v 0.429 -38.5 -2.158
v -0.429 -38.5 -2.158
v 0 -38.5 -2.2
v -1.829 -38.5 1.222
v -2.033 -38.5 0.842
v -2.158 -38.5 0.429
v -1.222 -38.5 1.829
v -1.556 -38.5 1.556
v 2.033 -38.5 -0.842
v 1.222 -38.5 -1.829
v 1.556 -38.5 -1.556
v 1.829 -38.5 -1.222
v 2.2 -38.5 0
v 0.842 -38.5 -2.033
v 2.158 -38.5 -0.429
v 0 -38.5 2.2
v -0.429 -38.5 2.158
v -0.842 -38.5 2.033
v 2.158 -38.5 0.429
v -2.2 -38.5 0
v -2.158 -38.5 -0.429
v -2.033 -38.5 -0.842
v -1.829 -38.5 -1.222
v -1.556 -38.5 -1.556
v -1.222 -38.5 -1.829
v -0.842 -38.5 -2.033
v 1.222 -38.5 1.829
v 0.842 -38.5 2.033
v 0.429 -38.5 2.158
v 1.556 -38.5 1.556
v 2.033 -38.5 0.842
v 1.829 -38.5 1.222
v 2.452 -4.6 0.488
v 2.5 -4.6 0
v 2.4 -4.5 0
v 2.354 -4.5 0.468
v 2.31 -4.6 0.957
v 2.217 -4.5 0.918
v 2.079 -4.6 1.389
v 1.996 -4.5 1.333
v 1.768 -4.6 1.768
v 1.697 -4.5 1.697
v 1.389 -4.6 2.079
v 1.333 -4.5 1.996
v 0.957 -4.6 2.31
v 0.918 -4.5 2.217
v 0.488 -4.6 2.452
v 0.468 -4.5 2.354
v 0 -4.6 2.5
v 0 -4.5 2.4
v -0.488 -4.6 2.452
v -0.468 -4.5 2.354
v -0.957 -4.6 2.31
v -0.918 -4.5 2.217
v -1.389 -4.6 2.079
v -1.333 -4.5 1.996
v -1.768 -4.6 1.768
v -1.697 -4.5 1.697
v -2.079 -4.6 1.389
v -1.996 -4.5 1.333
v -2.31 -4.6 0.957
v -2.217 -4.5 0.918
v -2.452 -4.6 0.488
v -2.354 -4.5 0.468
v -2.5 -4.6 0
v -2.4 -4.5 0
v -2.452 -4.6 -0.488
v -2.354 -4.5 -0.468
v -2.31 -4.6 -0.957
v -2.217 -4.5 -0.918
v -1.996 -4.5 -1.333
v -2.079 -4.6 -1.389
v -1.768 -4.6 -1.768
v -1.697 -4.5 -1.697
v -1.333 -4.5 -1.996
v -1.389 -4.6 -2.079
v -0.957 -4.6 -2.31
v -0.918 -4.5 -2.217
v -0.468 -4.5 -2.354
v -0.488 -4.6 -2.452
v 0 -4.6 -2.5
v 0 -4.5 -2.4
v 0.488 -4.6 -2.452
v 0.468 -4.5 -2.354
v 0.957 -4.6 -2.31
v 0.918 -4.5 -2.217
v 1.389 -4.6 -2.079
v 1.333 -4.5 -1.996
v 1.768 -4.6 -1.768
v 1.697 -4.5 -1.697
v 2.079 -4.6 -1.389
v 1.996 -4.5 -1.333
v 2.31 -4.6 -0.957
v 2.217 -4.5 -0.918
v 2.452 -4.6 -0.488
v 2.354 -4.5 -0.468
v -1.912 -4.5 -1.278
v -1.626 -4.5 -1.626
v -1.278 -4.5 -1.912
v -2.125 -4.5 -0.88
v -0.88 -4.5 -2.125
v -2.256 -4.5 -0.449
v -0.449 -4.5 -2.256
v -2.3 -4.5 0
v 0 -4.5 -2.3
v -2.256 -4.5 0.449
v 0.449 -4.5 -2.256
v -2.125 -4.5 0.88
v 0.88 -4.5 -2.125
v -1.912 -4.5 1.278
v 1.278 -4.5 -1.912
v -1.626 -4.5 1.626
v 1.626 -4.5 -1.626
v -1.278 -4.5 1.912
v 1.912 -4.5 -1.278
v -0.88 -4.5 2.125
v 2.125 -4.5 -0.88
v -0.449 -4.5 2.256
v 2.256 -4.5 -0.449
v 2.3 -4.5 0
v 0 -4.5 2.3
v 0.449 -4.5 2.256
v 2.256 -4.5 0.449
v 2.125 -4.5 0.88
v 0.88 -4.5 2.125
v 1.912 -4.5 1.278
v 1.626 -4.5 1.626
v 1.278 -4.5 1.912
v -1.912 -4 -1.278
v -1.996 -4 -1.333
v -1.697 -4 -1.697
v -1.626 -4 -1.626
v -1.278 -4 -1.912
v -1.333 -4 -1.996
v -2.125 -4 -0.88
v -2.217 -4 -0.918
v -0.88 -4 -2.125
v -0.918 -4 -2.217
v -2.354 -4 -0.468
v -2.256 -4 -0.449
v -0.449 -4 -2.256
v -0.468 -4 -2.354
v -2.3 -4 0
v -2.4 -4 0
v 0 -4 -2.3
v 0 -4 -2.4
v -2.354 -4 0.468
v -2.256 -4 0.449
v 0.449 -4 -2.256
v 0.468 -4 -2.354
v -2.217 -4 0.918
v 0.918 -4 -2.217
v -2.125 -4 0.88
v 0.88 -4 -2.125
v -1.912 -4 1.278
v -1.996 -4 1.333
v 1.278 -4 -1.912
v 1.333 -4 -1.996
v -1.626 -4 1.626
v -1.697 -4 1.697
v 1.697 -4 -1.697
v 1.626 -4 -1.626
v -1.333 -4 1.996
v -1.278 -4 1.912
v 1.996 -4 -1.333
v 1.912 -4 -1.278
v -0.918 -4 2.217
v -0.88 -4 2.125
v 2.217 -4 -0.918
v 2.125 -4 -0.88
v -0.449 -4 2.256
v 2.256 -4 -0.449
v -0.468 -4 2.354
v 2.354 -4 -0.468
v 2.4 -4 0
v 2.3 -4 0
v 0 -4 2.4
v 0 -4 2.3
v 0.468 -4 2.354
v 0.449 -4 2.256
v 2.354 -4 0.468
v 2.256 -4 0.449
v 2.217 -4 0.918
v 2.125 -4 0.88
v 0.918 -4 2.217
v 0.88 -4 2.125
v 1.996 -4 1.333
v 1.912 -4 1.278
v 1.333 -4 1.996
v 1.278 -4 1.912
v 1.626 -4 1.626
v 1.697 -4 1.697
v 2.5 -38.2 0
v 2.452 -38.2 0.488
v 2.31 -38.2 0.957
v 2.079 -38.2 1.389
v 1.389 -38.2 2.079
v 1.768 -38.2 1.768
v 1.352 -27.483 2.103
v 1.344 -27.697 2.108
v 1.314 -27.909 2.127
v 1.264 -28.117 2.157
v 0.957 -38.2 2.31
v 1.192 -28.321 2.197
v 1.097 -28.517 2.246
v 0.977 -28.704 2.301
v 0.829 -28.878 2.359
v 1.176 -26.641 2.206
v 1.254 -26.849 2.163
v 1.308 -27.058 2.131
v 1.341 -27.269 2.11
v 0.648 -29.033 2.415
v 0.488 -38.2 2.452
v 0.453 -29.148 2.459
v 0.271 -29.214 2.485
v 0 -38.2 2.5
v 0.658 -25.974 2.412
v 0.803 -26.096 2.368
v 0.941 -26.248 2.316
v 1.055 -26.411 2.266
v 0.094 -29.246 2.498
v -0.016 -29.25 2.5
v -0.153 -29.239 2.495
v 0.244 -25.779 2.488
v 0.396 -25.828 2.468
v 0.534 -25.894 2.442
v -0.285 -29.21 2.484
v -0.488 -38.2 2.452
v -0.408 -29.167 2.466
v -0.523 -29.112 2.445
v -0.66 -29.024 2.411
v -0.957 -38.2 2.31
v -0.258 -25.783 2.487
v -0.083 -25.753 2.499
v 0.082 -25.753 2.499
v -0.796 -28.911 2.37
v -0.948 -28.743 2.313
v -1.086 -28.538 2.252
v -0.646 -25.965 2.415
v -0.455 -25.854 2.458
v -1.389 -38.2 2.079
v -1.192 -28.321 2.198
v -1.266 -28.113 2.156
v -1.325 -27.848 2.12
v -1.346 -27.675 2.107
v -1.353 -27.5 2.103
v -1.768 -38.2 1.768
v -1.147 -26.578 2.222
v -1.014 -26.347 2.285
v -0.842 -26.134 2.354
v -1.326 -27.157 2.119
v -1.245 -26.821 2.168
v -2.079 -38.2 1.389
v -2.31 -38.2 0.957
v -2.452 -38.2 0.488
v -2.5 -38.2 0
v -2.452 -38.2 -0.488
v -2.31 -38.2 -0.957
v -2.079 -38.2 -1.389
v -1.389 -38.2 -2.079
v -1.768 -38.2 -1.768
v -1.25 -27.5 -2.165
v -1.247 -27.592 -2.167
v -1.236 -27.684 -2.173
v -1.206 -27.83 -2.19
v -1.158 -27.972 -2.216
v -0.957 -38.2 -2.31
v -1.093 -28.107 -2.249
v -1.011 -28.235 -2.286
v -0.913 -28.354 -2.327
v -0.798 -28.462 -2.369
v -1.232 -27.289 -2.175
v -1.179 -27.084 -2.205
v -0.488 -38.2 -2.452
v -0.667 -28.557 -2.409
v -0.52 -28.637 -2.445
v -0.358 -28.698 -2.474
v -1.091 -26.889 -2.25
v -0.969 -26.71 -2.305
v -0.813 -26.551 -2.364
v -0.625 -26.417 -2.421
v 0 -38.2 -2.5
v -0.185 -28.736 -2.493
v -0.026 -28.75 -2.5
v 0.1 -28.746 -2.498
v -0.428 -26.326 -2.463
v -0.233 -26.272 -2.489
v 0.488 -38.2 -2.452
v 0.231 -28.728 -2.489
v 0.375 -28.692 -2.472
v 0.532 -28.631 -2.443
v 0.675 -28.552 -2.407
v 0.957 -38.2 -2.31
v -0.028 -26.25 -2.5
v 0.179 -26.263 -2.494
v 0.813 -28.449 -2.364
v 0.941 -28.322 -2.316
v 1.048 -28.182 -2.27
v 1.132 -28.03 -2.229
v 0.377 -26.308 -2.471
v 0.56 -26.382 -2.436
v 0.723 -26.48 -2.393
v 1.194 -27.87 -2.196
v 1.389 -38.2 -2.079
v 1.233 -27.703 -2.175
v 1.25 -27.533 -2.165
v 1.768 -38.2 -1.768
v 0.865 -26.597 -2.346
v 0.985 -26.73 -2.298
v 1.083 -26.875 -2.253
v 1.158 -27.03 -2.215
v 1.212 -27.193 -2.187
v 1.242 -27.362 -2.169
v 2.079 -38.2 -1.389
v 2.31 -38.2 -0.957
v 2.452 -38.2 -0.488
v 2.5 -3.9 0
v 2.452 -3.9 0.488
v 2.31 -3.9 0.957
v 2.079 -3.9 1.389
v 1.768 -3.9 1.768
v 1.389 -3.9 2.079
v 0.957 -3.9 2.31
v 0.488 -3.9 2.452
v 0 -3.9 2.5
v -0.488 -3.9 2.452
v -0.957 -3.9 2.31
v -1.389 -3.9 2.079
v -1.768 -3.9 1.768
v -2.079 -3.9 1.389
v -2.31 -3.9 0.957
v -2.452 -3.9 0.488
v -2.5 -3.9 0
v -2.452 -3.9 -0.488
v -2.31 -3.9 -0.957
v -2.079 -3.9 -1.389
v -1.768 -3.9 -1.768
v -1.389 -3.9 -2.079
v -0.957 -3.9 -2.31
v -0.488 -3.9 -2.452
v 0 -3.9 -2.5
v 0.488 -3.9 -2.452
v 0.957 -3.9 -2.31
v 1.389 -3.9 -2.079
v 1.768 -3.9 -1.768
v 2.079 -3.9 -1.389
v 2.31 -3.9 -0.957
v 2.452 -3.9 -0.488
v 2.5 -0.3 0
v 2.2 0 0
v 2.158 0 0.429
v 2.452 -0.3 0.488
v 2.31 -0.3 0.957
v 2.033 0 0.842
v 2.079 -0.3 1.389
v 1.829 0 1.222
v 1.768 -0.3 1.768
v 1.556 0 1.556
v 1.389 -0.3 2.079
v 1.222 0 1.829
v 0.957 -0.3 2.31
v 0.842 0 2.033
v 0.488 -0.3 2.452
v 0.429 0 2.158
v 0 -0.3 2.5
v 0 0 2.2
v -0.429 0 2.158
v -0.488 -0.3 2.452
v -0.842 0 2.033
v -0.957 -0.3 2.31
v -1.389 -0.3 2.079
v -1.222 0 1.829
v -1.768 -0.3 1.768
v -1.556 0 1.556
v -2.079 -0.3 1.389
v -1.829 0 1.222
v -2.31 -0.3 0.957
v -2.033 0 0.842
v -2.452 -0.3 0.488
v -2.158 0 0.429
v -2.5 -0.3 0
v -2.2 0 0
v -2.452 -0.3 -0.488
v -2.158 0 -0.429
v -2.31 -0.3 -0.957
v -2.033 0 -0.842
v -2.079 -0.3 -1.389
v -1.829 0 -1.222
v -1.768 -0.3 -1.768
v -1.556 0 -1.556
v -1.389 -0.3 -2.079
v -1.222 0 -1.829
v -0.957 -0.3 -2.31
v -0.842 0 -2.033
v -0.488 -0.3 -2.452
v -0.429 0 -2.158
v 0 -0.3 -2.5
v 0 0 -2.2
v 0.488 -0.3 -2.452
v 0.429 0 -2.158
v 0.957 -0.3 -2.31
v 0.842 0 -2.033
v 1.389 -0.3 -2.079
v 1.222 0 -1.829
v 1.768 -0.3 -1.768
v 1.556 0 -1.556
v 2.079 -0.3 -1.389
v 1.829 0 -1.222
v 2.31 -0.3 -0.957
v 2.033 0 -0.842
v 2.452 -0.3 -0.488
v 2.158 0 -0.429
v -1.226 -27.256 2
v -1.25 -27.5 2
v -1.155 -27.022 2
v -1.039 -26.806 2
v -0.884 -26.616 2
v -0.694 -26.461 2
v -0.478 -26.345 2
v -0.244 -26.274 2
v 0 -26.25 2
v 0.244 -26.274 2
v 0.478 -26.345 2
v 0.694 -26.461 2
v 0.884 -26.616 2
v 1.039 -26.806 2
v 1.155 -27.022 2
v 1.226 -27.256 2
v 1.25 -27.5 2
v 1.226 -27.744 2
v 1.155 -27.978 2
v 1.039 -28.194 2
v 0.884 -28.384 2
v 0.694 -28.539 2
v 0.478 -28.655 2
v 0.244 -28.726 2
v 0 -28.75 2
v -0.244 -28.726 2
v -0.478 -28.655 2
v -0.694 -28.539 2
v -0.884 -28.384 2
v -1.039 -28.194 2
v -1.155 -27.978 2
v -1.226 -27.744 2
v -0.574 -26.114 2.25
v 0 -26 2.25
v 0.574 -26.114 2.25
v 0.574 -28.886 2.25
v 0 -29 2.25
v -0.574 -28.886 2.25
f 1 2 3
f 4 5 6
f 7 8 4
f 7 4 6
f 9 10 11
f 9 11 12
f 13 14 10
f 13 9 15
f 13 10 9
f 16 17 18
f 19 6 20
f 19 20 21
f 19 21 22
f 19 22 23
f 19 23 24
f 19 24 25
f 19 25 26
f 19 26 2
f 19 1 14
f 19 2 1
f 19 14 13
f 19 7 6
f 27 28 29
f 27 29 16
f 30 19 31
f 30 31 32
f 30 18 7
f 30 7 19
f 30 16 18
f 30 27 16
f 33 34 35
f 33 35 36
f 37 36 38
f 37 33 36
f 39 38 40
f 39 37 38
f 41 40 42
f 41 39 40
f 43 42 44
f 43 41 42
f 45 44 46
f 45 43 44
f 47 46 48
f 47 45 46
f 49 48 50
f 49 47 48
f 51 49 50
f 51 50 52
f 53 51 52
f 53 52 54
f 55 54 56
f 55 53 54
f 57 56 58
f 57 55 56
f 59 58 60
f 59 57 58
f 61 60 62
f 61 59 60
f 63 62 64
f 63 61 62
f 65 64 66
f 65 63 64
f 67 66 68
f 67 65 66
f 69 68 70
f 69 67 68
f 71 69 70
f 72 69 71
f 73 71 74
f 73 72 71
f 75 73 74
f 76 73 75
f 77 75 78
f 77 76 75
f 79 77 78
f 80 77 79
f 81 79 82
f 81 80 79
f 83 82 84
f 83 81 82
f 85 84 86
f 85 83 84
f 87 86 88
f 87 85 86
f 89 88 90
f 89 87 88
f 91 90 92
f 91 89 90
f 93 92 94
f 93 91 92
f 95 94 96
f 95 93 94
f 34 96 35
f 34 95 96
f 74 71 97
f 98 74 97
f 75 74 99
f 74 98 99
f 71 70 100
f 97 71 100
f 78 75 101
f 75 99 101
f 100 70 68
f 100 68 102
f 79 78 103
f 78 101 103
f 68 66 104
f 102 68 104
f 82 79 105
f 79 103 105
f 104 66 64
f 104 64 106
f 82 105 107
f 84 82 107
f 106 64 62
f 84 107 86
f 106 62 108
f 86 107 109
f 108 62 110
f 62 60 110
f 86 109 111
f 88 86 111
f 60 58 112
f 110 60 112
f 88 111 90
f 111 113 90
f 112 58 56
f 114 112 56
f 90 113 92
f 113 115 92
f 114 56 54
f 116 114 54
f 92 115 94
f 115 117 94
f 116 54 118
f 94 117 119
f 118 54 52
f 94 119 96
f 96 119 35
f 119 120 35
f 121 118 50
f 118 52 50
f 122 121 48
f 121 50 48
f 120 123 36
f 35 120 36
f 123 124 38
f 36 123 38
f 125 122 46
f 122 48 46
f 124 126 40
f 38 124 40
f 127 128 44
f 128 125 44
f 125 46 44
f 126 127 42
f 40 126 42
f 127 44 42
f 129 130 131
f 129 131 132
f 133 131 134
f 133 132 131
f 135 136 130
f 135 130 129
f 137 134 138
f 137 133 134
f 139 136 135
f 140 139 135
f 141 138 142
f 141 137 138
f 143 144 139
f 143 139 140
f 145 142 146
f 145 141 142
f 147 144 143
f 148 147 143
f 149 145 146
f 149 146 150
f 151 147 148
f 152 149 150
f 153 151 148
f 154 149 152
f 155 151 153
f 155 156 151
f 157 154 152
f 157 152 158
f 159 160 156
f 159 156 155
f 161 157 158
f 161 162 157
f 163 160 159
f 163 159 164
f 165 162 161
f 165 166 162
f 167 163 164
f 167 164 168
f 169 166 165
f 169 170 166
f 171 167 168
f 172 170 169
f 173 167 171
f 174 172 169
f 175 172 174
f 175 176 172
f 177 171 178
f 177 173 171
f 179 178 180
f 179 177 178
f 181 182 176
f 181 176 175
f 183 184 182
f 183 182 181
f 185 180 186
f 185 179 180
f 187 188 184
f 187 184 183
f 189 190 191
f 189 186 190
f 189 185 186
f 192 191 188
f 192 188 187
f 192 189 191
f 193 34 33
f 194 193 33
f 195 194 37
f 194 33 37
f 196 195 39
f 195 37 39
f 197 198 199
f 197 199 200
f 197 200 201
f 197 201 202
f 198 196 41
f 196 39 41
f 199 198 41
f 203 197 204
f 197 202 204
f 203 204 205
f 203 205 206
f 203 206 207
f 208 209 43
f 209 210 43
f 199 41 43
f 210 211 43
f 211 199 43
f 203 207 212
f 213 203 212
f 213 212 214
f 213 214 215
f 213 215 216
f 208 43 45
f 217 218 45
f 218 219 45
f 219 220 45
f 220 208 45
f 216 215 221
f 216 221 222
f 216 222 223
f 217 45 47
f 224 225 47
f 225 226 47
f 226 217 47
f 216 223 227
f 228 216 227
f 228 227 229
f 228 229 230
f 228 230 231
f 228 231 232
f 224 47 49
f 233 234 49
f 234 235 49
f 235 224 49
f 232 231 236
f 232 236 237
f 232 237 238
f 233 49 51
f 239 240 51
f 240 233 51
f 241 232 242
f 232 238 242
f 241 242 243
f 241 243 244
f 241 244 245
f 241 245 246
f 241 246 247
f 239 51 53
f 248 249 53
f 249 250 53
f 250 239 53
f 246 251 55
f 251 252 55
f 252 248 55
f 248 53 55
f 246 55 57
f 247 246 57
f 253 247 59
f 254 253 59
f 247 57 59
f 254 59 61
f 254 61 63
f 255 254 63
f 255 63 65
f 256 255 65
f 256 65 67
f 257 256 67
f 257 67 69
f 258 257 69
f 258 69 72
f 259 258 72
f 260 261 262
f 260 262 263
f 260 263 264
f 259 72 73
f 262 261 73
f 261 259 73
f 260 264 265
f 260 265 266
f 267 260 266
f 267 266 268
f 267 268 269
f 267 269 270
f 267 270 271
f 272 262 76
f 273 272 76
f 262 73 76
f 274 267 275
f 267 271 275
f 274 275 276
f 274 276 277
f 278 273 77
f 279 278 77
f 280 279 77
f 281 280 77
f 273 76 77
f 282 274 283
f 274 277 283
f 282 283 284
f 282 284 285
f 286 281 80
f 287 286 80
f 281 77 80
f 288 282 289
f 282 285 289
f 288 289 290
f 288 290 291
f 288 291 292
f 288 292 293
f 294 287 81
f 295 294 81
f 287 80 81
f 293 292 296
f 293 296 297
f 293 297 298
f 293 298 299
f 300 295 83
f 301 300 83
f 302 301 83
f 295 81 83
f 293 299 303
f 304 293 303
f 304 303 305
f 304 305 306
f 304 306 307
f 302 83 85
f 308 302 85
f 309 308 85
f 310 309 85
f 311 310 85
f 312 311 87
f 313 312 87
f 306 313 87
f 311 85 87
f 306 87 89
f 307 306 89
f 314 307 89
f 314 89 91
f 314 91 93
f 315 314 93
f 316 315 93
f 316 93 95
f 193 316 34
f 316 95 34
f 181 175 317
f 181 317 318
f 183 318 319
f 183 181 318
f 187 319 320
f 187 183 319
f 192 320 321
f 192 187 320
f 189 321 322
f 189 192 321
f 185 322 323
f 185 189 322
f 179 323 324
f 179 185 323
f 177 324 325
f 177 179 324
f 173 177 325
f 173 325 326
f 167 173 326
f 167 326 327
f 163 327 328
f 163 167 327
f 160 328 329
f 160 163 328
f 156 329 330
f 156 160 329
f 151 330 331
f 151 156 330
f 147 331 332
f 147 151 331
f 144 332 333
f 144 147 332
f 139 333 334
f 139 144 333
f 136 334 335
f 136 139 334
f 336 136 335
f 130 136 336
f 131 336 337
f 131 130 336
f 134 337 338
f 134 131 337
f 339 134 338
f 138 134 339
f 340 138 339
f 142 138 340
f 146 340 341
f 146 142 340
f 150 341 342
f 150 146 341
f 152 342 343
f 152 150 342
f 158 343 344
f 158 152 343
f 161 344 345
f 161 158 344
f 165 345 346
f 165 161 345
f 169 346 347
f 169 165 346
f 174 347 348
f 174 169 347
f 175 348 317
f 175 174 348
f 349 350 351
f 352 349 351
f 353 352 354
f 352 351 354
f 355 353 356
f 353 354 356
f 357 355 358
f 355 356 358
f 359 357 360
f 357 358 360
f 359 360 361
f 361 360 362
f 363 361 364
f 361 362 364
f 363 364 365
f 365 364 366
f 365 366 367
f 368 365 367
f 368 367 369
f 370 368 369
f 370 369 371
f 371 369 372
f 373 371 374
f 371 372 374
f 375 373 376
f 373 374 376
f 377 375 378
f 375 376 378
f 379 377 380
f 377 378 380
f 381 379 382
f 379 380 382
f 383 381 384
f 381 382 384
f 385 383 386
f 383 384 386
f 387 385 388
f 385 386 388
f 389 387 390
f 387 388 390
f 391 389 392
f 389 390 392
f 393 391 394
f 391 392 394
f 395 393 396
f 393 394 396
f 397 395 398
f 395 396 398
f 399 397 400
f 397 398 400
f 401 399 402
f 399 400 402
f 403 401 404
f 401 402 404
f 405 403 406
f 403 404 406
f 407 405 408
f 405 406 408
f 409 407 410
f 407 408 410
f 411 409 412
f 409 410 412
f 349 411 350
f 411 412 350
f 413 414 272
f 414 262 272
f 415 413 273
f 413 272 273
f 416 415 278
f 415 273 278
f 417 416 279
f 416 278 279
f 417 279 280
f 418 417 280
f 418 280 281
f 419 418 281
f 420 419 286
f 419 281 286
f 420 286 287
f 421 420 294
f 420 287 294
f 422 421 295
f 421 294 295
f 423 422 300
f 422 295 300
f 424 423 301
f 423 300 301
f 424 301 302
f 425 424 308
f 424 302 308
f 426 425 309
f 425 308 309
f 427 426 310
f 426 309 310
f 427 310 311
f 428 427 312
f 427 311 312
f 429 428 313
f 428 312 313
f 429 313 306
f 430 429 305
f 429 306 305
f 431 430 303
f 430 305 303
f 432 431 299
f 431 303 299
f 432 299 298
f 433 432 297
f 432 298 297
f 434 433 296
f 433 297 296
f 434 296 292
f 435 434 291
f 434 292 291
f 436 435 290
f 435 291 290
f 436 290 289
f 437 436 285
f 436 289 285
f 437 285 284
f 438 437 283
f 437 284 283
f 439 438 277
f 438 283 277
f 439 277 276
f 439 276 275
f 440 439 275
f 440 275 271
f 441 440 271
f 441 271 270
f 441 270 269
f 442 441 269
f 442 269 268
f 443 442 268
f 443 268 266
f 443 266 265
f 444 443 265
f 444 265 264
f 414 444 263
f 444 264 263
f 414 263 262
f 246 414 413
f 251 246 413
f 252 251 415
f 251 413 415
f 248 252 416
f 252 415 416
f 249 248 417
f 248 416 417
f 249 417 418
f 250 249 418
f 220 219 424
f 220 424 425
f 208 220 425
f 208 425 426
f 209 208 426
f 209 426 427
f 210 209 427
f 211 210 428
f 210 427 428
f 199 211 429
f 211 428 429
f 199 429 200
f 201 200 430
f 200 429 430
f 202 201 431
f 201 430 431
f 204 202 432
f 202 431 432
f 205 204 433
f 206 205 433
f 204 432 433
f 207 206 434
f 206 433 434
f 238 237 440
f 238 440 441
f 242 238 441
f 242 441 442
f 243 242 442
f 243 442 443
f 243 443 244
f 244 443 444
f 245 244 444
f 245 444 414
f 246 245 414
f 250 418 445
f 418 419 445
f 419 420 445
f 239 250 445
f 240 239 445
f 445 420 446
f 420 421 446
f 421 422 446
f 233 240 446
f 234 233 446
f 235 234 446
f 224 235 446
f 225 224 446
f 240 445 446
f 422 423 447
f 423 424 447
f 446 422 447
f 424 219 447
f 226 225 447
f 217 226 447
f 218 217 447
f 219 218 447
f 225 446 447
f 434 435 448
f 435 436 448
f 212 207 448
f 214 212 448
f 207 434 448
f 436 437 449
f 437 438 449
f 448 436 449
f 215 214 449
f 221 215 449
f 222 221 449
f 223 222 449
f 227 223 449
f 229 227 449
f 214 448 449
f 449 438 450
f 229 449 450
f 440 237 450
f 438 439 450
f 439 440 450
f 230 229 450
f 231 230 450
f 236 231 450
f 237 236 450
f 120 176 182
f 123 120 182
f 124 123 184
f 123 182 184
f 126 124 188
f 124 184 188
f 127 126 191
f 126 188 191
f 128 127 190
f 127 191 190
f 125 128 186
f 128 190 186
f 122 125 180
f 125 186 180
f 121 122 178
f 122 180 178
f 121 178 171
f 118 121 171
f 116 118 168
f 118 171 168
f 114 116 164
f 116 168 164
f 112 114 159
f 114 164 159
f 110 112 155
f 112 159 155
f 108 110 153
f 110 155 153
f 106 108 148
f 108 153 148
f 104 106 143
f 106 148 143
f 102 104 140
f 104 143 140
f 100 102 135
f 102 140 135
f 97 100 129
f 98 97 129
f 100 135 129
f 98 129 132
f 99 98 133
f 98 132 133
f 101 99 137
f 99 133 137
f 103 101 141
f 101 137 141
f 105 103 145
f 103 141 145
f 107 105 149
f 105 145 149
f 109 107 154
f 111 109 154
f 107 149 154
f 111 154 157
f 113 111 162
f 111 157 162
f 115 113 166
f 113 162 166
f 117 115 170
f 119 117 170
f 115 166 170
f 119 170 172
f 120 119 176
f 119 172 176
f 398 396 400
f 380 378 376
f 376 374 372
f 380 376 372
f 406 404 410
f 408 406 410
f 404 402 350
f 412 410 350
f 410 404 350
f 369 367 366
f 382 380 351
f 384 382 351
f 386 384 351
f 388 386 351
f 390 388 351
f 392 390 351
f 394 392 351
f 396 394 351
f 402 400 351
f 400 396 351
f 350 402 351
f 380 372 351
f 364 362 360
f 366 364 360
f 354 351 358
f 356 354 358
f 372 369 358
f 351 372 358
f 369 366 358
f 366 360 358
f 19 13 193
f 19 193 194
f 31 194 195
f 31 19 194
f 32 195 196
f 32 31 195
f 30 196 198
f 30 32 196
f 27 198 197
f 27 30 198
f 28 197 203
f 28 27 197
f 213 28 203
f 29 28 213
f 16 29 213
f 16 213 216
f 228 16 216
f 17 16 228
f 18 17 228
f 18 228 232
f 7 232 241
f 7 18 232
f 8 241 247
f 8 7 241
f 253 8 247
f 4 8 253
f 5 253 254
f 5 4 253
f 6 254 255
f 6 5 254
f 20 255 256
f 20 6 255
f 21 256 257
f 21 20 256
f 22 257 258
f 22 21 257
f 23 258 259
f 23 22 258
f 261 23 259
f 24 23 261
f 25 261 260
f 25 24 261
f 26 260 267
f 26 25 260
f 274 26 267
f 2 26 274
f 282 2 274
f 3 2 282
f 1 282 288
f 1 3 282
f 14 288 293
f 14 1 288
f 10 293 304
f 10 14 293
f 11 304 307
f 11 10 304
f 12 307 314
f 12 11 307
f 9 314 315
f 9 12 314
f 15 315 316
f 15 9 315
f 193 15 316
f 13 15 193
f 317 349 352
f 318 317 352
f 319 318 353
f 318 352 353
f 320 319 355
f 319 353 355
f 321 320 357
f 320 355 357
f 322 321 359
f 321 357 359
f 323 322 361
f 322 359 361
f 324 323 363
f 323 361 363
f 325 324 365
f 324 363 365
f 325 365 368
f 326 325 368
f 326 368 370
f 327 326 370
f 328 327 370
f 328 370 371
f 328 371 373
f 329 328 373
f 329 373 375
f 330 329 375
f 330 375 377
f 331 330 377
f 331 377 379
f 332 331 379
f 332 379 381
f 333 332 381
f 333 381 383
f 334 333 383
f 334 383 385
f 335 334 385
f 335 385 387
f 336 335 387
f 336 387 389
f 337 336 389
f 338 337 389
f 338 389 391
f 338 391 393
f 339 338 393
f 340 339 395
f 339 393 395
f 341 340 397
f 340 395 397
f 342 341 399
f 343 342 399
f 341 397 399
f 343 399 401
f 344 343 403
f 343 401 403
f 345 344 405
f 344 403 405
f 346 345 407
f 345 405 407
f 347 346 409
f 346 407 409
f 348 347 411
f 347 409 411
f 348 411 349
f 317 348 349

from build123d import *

# Parameters (mm, degrees)
F0_R           = 2.5
F0_R_2         = 2.3
F1_DEPTH       = 38.5
F2_SIZE        = 0.3
F5_D           = 2.5
F5_CSINK_D     = 4.5
F5_CSINK_ANGLE = 90
F6_START       = 4
F6_DEPTH       = 0.5
F7_SIZE        = 0.1


with BuildPart() as f1:
    # F0 (on Front) → F1 (new body)
    with BuildSketch(Plane.XZ):
        Circle(F0_R)
        Circle(F0_R_2, mode=Mode.SUBTRACT)
        Circle(F0_R_2)
    extrude(amount=F1_DEPTH)

    # F2
    f2_edges = [f1.edges().sort_by_distance(p)[0] for p in [
        (-2.5, -38.5, 0),
        (-2.5, 0, 0),
    ]]
    chamfer(f2_edges, length=F2_SIZE)

    # F5 (through all)
    with Locations(Plane.XY.offset(3)):
        with Locations((0, -27.5)):
            CounterSinkHole(F5_D / 2, F5_CSINK_D / 2, counter_sink_angle=F5_CSINK_ANGLE)

    # F0 (on Front) → F6 (cut)
    with BuildSketch(Plane.XZ.offset(F6_START)):
        Circle(F0_R)
        Circle(F0_R_2, mode=Mode.SUBTRACT)
    extrude(amount=F6_DEPTH, mode=Mode.SUBTRACT)

    # F7
    f7_edges = [f1.edges().sort_by_distance(p)[0] for p in [
        (-2.5, -4, 0),
        (-2.5, -4.5, 0),
    ]]
    chamfer(f7_edges, length=F7_SIZE)


solid = f1.part
